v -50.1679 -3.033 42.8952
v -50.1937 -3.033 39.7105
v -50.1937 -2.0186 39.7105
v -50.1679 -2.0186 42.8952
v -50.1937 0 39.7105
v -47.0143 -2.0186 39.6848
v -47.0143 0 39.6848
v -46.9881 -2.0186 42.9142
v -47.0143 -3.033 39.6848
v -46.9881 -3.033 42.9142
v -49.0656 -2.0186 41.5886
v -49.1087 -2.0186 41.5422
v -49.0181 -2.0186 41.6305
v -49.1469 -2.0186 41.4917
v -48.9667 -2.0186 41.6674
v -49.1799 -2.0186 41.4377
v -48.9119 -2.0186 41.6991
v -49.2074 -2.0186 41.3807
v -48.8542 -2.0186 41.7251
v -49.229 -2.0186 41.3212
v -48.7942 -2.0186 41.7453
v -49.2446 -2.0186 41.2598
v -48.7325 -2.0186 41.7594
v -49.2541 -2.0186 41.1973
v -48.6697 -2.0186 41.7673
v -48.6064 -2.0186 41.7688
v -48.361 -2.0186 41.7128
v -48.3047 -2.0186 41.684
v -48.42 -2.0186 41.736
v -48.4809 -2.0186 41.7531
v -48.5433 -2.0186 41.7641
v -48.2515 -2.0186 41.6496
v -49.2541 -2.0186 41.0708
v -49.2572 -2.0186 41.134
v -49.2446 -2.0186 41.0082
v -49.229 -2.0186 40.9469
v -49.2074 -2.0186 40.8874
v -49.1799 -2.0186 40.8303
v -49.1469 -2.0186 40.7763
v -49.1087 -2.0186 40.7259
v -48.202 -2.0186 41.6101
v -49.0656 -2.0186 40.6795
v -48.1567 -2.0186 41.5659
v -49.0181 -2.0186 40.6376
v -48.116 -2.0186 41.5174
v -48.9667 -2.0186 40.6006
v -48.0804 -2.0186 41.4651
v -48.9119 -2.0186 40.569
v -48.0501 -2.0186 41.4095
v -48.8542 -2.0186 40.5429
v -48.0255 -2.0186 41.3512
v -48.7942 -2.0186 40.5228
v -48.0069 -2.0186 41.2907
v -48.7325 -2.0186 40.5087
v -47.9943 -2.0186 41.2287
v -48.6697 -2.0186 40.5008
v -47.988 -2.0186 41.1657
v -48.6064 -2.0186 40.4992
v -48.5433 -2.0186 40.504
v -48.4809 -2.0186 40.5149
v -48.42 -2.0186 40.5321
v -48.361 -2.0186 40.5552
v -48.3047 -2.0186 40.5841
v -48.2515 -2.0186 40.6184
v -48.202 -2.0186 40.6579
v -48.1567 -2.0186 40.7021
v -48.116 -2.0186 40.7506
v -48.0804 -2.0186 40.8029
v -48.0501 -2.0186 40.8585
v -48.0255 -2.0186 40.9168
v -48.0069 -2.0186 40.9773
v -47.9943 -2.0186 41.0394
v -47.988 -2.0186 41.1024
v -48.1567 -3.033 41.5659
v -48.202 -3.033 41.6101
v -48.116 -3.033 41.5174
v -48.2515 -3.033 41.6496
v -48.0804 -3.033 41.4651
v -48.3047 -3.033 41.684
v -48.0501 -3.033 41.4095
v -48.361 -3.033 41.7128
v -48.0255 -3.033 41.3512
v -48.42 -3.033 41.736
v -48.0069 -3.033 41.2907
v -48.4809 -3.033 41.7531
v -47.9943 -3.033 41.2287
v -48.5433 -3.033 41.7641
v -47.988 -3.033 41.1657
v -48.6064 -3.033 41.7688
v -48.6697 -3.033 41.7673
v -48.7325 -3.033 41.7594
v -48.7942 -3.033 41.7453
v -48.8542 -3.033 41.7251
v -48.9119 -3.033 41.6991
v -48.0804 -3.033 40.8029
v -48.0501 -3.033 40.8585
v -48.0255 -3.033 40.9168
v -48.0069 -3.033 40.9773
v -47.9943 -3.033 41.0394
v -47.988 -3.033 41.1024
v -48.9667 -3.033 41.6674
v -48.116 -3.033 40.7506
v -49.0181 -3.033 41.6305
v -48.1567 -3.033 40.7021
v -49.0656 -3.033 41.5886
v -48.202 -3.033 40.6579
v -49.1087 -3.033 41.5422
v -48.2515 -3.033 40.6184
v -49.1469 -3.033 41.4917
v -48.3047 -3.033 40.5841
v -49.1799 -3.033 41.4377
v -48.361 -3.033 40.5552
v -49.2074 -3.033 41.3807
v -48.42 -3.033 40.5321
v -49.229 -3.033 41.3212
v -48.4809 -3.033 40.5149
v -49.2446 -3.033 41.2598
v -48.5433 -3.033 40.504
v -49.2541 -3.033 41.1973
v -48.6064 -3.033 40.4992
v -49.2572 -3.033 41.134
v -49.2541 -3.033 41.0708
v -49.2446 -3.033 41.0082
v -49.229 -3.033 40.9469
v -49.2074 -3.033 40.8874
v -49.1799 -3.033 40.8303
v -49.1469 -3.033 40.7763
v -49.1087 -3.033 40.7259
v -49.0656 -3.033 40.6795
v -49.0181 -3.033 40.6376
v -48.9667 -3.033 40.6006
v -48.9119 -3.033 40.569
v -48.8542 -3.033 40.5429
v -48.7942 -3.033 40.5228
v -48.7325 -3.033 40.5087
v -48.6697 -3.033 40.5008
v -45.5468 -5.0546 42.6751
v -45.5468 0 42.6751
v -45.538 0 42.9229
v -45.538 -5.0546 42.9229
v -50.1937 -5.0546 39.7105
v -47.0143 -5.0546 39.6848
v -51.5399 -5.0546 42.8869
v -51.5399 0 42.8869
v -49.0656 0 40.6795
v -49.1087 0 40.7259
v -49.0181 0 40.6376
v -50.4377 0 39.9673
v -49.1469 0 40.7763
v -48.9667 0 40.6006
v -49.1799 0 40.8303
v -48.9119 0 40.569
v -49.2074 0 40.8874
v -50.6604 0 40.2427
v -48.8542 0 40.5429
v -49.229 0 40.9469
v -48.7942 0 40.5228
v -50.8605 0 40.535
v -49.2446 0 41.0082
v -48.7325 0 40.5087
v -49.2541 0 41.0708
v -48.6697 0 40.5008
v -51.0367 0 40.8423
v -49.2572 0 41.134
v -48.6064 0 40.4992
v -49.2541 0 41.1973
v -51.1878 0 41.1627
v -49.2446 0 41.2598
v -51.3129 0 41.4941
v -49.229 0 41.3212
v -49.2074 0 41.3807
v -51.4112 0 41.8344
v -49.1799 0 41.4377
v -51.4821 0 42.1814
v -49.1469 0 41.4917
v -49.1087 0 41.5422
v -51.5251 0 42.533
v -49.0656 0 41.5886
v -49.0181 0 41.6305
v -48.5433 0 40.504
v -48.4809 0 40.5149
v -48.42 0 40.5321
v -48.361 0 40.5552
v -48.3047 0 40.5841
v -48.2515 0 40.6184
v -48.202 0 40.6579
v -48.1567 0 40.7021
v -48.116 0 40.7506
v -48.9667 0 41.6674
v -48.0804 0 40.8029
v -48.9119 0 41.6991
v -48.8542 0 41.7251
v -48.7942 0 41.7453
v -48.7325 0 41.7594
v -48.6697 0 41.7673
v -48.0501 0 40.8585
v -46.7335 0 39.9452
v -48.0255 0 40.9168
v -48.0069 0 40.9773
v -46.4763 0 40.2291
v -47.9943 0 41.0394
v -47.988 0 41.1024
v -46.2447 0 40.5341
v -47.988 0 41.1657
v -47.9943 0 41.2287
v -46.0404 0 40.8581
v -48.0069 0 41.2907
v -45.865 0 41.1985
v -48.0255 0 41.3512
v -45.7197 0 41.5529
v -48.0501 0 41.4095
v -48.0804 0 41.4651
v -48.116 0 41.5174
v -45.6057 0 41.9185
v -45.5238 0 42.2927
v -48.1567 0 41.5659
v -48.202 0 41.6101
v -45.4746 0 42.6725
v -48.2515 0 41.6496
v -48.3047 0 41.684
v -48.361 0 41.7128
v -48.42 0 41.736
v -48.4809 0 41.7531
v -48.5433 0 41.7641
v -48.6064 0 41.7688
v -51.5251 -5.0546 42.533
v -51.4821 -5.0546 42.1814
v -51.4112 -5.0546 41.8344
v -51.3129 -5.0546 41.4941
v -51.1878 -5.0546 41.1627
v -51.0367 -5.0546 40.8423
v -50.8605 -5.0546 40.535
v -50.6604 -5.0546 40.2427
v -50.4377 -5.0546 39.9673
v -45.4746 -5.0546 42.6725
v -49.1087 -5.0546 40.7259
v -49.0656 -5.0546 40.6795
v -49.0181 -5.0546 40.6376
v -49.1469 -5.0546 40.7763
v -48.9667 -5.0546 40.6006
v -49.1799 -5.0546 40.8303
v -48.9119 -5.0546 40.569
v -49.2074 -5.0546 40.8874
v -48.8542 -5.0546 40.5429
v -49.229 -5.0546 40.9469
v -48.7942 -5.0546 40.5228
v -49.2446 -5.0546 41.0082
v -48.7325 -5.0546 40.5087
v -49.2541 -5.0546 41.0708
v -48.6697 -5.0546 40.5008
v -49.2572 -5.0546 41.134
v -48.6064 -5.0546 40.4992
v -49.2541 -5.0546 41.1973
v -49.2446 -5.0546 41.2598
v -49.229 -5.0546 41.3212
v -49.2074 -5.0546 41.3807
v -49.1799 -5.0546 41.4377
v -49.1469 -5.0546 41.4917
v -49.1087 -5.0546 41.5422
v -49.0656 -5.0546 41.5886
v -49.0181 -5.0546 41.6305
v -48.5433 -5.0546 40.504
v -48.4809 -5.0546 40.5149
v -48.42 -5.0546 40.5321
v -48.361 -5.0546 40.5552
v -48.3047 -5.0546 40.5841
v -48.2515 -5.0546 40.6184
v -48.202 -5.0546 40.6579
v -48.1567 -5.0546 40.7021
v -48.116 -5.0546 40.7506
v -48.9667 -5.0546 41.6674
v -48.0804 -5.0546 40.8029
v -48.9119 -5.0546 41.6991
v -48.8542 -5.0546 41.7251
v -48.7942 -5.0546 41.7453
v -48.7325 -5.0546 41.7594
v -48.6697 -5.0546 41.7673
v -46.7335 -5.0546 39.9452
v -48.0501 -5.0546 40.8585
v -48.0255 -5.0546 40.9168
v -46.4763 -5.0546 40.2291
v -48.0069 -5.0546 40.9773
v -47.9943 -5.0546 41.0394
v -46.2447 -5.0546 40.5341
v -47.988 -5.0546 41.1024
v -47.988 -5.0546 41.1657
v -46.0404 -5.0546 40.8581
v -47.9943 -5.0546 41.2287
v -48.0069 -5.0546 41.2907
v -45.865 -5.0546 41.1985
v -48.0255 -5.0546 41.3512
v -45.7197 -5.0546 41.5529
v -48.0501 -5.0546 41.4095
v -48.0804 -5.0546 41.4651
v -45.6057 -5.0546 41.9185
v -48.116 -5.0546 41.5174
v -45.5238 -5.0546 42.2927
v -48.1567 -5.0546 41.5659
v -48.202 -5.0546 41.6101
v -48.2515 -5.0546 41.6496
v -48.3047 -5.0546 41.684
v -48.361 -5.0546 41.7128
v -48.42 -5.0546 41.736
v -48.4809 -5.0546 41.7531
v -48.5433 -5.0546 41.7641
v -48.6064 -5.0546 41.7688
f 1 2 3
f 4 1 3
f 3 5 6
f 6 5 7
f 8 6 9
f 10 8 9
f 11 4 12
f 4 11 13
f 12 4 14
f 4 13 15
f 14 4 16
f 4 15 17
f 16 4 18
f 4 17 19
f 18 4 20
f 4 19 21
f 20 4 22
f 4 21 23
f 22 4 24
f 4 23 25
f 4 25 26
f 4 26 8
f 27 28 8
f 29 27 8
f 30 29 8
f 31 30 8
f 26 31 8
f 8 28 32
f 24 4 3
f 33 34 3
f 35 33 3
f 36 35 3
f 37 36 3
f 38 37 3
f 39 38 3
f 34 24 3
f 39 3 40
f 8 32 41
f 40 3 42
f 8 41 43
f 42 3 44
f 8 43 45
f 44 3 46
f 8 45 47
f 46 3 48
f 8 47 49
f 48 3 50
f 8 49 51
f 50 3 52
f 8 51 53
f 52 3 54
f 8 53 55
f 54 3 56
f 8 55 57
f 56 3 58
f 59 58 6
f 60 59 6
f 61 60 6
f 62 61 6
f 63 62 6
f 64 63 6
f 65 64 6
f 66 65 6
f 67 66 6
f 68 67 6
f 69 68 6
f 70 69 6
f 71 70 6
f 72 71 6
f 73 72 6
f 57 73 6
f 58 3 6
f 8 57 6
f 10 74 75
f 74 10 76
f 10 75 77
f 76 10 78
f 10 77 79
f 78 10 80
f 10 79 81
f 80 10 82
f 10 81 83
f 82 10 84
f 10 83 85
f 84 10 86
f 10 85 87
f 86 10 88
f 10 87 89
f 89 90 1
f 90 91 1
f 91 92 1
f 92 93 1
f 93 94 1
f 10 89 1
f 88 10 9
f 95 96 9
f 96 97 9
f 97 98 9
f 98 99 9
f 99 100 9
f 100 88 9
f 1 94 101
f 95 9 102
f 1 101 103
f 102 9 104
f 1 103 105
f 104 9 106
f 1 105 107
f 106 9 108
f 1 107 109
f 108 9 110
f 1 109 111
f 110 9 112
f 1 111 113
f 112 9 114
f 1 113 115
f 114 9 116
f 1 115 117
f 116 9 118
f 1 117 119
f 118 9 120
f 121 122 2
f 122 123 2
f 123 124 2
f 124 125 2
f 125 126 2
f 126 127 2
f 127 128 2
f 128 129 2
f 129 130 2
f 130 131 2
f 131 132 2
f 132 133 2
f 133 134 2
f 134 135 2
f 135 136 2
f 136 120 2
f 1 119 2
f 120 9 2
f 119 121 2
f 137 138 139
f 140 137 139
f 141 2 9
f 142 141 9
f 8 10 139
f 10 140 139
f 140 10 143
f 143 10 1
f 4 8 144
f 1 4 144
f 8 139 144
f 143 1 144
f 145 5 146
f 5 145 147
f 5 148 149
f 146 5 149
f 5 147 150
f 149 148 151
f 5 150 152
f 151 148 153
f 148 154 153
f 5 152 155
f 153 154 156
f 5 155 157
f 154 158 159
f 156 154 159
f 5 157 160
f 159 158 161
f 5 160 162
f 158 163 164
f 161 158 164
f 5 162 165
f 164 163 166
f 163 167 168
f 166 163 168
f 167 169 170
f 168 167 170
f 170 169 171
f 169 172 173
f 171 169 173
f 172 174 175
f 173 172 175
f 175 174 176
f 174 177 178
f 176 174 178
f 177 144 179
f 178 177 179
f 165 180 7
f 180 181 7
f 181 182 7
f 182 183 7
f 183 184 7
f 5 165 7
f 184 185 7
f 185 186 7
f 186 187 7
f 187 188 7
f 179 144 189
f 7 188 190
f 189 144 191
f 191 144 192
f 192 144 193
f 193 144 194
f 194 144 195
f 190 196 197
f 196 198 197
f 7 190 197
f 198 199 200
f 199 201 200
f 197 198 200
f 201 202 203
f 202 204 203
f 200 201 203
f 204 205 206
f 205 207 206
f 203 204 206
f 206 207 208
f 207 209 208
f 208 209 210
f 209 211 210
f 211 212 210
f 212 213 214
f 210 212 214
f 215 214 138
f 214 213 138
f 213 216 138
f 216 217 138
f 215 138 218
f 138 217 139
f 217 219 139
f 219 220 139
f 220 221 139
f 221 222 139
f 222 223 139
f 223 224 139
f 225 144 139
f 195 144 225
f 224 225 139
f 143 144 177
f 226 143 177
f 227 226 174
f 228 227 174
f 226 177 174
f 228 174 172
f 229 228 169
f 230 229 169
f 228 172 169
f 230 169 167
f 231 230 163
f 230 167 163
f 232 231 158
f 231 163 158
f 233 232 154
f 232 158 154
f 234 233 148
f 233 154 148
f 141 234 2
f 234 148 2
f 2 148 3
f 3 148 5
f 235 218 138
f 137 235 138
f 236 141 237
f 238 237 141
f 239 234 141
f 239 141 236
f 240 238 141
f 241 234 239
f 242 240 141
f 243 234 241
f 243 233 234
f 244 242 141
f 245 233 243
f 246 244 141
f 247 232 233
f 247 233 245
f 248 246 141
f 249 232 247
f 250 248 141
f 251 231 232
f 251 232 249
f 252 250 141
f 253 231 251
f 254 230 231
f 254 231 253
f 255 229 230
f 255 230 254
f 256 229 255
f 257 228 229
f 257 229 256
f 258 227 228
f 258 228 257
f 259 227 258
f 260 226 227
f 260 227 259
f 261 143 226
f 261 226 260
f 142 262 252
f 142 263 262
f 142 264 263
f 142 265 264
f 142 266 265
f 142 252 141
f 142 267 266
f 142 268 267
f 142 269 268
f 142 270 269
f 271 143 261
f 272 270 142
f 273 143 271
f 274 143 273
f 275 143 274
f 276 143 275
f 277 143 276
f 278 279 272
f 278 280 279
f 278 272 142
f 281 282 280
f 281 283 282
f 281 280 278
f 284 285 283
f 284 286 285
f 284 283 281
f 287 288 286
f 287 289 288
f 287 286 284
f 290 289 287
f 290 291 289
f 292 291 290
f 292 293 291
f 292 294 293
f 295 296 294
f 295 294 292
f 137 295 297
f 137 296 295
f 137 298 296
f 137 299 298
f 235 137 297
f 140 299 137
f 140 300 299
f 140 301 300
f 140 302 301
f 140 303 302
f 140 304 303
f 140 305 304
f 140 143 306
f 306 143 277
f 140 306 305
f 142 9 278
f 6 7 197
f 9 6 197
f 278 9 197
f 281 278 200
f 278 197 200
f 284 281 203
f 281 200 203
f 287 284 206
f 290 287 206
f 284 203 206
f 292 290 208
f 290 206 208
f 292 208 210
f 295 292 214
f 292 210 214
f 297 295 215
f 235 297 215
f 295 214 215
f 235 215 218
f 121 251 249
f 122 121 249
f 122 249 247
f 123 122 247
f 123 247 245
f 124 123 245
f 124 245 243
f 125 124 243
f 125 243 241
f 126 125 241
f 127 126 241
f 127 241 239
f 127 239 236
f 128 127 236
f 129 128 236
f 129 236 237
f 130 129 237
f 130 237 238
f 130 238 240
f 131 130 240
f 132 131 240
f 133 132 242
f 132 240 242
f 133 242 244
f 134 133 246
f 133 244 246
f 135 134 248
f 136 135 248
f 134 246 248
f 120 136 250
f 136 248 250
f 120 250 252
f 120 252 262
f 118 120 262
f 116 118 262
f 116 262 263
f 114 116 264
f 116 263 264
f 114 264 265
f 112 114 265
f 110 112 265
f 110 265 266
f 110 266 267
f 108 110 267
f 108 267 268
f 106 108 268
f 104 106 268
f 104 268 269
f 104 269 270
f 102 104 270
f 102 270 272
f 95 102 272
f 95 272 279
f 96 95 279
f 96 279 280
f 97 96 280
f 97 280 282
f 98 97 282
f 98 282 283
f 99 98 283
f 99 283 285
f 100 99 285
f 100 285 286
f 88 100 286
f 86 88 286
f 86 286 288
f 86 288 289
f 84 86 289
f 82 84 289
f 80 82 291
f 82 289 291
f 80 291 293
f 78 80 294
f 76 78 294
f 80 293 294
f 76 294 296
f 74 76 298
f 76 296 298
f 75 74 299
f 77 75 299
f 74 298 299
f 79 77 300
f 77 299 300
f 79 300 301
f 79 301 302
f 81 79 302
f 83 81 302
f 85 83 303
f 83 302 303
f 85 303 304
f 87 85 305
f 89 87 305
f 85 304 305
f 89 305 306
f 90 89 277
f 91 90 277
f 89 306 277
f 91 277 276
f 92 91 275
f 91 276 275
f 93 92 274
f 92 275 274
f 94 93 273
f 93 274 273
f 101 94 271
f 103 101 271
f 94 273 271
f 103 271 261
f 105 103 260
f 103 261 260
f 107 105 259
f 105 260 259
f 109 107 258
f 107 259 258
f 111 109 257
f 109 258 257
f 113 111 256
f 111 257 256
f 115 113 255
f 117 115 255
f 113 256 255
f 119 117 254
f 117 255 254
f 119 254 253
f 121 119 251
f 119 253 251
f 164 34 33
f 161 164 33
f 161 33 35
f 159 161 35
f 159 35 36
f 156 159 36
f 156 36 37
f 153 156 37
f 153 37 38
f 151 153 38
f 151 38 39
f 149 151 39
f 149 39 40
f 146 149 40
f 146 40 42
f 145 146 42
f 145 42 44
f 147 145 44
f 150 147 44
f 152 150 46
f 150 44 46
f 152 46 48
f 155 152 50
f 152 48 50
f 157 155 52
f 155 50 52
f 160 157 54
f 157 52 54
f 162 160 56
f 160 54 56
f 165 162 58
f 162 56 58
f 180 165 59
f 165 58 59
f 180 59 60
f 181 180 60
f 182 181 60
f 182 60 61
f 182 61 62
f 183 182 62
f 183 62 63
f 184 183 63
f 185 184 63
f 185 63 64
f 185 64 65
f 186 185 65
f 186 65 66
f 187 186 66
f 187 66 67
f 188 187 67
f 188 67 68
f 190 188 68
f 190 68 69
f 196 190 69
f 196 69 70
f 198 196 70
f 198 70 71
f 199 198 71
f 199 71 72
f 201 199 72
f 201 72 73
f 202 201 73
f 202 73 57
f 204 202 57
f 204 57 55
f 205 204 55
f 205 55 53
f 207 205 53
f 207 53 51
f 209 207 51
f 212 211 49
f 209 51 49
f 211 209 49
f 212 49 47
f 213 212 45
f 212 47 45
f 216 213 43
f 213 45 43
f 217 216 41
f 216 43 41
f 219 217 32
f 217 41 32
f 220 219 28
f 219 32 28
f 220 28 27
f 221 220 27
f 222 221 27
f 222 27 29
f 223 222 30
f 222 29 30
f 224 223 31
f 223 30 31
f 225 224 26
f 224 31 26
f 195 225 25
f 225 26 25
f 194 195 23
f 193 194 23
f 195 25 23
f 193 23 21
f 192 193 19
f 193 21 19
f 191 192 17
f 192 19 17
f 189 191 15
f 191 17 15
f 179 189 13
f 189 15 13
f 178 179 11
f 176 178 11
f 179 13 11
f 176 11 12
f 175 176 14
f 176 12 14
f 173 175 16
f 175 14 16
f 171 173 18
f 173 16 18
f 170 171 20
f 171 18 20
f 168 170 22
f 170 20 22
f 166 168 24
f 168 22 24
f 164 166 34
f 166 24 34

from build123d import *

# Parameters (mm, degrees)
F1_DEPTH = 5.0546
F2_D     = 1.27
F4_DEPTH = 25.4


# Not quite as in the source:
# - a feature names something its author has since deleted; it is built from what else it names


with BuildPart() as f1:
    # F0 (on Front) → F1 (new body)
    with BuildSketch(Plane.XZ):
        Polygon((-45.5380498264, 42.9229369958), (-51.539901644, 42.8869388998), (-45.5468128822, 42.675064641), align=None)
        with BuildLine():
            Line((-45.5468128822, 42.675064641), (-51.539901644, 42.8869388998))
            ThreePointArc((-51.539901644, 42.8869388998), (-51.187813042, 41.162667719), (-50.1936934888, 39.710495621))
            Line((-50.1936934888, 39.710495621), (-47.0142699778, 39.6847687662))
            ThreePointArc((-47.0142699778, 39.6847687662), (-45.9490353675, 41.0264089842), (-45.474623776, 42.6725125324))
            Line((-45.474623776, 42.6725125324), (-45.5468128822, 42.675064641))
        make_face()
    extrude(amount=F1_DEPTH)

    # F2 (through all)
    with Locations(Plane(origin=(0, 0, 0), x_dir=(1, 0, 0), z_dir=(0, 1, 0))):
        with Locations((-48.6222168853, -41.1340259016)):
            Hole(F2_D / 2)

    # F3 (on face) → F4 (cut)
    with BuildSketch(Plane(origin=(0.3180170752, 0, 39.3017713856), x_dir=(0.999967264, 0, -0.0080914079), z_dir=(-0.0080914079, 0, -0.999967264))):
        Polygon((-50.5133641684, 2.0186165348), (-48.9236003704, 2.0186165348), (-47.3338365724, 2.0186165348), (-47.3338365724, 3.0329779256), (-50.5133641684, 3.0329779256), align=None)
    extrude(amount=-F4_DEPTH, mode=Mode.SUBTRACT)


solid = f1.part
